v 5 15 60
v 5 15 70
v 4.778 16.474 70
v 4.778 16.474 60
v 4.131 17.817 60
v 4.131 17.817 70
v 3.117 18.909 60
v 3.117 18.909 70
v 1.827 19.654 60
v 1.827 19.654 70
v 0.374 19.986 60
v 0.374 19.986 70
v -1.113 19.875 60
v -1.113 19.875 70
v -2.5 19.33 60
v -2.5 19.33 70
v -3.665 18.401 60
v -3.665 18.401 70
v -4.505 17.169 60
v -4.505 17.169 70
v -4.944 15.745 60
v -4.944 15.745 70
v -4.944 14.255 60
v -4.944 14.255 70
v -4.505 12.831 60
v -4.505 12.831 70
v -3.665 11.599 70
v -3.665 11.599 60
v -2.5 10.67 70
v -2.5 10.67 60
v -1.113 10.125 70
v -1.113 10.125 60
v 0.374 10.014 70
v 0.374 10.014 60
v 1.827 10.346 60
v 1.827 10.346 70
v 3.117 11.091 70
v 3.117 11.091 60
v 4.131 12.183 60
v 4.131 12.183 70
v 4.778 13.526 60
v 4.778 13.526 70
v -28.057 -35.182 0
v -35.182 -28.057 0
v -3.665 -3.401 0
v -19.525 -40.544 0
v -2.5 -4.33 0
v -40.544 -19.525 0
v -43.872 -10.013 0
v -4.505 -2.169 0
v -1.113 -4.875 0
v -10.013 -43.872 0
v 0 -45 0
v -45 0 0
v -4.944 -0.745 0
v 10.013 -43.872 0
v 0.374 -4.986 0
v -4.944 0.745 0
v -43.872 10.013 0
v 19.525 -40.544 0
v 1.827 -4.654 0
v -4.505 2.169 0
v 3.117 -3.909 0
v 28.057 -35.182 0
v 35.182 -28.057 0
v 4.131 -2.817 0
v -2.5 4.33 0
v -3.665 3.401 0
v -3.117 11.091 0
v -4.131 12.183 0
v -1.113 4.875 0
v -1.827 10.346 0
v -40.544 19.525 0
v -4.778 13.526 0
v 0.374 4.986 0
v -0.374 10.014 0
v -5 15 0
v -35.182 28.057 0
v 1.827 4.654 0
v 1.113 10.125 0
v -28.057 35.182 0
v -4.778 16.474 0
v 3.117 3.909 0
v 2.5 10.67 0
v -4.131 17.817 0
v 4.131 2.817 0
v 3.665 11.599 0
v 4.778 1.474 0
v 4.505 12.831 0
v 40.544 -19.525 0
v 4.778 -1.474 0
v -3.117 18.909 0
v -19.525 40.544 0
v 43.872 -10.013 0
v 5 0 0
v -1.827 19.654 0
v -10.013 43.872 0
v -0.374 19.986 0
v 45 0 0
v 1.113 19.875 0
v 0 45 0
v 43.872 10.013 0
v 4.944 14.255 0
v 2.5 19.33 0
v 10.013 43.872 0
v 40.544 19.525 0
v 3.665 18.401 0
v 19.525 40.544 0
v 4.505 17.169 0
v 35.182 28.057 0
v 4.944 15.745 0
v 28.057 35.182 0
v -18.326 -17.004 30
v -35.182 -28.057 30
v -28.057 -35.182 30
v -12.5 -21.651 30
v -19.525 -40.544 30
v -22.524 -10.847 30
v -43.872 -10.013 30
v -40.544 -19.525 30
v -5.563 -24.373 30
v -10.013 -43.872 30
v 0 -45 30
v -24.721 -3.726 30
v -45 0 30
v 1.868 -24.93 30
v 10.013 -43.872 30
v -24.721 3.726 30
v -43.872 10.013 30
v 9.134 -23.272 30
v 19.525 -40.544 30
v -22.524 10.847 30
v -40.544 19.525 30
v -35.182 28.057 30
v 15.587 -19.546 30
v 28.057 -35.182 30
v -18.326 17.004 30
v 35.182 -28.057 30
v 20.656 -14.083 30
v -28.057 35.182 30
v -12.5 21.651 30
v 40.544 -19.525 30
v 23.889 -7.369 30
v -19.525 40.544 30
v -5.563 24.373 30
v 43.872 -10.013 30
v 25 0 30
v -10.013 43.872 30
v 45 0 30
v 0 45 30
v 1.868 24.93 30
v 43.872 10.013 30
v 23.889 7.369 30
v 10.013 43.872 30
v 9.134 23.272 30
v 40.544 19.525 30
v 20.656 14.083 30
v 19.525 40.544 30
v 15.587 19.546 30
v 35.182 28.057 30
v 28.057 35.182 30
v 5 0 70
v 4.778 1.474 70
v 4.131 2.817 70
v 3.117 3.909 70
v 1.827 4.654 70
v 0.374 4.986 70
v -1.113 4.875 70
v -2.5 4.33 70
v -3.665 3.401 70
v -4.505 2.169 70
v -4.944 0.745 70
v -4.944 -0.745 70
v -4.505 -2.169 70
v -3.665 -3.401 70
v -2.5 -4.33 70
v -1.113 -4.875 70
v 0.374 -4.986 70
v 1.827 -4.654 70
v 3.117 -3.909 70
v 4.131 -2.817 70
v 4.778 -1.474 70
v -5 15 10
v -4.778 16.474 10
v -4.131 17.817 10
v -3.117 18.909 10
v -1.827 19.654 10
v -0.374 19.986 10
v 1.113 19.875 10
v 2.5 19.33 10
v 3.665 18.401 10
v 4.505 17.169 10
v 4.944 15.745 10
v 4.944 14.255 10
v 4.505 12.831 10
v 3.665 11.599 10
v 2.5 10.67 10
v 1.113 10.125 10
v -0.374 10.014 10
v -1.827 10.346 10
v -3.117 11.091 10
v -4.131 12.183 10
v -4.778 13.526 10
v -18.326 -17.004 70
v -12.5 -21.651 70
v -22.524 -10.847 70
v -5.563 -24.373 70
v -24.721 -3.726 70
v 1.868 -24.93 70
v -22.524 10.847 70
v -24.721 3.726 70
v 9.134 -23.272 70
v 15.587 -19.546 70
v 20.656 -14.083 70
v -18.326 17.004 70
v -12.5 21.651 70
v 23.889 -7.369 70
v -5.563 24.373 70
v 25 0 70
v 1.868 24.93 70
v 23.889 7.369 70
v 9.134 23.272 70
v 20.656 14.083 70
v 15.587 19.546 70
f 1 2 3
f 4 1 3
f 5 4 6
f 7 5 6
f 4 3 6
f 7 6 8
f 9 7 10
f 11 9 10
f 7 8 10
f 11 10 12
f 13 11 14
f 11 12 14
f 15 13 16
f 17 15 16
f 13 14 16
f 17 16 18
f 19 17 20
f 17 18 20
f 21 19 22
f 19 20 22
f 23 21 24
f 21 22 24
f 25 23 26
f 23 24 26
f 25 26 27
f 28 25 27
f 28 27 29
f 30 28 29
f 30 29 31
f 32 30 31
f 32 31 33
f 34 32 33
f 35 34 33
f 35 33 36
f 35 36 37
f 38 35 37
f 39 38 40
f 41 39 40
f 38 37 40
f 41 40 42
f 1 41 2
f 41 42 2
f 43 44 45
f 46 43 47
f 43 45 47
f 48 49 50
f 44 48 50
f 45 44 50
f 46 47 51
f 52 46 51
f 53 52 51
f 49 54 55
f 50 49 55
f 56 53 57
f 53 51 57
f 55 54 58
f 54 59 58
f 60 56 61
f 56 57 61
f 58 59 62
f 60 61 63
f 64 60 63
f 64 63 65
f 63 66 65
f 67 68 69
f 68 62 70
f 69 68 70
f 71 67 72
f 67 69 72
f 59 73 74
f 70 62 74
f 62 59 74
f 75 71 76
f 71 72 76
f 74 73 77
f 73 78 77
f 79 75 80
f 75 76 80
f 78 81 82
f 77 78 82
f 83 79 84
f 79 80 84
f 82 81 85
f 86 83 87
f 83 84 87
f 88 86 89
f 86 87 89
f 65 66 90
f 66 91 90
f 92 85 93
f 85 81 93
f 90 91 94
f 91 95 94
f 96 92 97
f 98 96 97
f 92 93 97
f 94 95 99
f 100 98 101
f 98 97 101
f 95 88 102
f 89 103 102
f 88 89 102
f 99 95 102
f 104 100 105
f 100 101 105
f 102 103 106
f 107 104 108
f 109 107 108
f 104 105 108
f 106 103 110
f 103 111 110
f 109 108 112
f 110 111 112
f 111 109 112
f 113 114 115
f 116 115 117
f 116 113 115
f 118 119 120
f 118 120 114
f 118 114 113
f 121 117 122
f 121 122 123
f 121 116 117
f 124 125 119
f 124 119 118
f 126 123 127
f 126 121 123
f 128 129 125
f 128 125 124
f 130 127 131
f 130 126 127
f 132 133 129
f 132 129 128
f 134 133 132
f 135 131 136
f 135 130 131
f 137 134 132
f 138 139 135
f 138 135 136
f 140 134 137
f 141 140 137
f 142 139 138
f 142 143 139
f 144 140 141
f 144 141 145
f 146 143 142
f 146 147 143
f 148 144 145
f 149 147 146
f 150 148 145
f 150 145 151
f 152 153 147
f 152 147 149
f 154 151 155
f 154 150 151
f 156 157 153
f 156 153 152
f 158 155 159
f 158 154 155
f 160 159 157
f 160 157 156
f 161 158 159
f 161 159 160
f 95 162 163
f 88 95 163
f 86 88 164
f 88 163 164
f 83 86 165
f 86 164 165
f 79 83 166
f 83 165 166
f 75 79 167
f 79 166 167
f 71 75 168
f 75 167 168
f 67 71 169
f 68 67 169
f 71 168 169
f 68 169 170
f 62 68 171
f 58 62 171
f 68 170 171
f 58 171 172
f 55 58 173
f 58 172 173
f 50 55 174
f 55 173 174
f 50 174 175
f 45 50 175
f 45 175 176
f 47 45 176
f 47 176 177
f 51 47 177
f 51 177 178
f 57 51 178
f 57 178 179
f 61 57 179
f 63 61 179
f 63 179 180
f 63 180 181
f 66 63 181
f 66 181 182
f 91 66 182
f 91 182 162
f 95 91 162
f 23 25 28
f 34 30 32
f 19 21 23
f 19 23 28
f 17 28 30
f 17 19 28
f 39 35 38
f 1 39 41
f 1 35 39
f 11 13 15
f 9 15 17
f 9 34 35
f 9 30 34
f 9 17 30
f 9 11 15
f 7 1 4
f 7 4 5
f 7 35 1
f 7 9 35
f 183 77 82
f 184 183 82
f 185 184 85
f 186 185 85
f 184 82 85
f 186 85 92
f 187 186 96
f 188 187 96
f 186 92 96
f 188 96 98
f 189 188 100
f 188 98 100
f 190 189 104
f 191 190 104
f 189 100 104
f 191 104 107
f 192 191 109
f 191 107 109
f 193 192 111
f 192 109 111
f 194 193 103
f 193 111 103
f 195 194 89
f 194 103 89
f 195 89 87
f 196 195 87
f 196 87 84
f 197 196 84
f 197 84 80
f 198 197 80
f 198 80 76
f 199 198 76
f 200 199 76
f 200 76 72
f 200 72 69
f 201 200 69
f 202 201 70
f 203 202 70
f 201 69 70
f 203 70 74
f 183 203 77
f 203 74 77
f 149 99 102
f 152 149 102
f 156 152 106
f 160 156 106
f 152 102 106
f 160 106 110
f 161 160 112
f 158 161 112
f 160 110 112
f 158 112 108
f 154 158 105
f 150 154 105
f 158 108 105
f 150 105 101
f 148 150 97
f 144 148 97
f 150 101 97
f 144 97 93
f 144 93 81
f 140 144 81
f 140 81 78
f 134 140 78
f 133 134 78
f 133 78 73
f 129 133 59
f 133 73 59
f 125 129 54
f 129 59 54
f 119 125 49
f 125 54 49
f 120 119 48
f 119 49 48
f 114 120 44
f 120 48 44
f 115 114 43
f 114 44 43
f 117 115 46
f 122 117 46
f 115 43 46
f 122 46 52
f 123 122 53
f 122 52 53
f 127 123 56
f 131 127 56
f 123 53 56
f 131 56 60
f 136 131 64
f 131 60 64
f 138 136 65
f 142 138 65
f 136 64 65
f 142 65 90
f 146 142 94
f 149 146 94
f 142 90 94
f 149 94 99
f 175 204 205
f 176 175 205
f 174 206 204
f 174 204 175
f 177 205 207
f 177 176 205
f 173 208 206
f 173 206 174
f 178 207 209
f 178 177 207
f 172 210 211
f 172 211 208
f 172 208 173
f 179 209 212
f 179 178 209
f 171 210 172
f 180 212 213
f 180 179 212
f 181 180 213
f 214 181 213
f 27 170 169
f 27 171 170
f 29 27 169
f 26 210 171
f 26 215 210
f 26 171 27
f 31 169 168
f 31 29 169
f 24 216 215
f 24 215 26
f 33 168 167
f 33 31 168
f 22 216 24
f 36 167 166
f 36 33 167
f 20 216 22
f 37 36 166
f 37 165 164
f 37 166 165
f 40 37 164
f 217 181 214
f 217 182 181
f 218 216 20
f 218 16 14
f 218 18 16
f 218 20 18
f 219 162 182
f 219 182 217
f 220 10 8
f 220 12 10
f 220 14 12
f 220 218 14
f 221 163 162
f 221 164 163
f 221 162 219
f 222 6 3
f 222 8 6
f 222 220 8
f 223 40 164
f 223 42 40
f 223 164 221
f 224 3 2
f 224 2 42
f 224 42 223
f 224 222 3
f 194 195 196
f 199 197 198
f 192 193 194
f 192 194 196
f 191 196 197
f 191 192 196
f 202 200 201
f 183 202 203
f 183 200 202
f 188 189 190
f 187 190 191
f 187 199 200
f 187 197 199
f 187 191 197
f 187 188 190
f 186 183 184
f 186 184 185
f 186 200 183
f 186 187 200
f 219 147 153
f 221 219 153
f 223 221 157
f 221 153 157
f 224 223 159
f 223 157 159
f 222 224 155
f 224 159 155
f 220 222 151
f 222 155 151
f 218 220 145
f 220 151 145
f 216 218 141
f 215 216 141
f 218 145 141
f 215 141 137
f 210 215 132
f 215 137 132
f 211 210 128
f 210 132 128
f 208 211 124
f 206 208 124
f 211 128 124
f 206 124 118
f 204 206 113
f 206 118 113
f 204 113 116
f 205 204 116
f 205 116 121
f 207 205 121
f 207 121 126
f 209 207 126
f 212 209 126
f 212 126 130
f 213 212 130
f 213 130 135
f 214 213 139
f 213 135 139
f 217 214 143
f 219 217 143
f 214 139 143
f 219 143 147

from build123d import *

# Parameters (mm, degrees)
ESQUISSE1_R             = 45
BOSS_EXTRU_1_DEPTH      = 30
ESQUISSE2_R             = 25
BOSS_EXTRU_2_DEPTH      = 40
ESQUISSE3_R             = 5
ENL_V_MAT_EXTRU_1_DEPTH = 71
ESQUISSE6_R             = 5
ENL_V_MAT_EXTRU_3_DEPTH = 10
ESQUISSE7_R             = 5
ENL_V_MAT_EXTRU_4_DEPTH = 10


with BuildPart() as part:
    # Esquisse1 → Boss.-Extru.1 (new body)
    with BuildSketch(Plane.XY):
        Circle(ESQUISSE1_R)
    extrude(amount=BOSS_EXTRU_1_DEPTH)

    # Esquisse2 → Boss.-Extru.2 (add)
    with BuildSketch(Plane.XY.offset(30)):
        Circle(ESQUISSE2_R)
    extrude(amount=BOSS_EXTRU_2_DEPTH)

    # Esquisse3 → Enlèv. mat.-Extru.1 (cut, through all)
    with BuildSketch(Plane.XY.offset(70)):
        Circle(ESQUISSE3_R)
    extrude(amount=-ENL_V_MAT_EXTRU_1_DEPTH, mode=Mode.SUBTRACT)

    # Esquisse6 → Enlèv. mat.-Extru.3 (cut)
    with BuildSketch(Plane.XY.offset(70)):
        with Locations((0, 15)):
            Circle(ESQUISSE6_R)
    extrude(amount=-ENL_V_MAT_EXTRU_3_DEPTH, mode=Mode.SUBTRACT)

    # Esquisse7 → Enlèv. mat.-Extru.4 (cut)
    with BuildSketch(Plane(origin=(0, 0, 0), x_dir=(-1, 0, 0), z_dir=(0, 0, -1))):
        with Locations((0, 15)):
            Circle(ESQUISSE7_R)
    extrude(amount=-ENL_V_MAT_EXTRU_4_DEPTH, mode=Mode.SUBTRACT)


solid = part.part
